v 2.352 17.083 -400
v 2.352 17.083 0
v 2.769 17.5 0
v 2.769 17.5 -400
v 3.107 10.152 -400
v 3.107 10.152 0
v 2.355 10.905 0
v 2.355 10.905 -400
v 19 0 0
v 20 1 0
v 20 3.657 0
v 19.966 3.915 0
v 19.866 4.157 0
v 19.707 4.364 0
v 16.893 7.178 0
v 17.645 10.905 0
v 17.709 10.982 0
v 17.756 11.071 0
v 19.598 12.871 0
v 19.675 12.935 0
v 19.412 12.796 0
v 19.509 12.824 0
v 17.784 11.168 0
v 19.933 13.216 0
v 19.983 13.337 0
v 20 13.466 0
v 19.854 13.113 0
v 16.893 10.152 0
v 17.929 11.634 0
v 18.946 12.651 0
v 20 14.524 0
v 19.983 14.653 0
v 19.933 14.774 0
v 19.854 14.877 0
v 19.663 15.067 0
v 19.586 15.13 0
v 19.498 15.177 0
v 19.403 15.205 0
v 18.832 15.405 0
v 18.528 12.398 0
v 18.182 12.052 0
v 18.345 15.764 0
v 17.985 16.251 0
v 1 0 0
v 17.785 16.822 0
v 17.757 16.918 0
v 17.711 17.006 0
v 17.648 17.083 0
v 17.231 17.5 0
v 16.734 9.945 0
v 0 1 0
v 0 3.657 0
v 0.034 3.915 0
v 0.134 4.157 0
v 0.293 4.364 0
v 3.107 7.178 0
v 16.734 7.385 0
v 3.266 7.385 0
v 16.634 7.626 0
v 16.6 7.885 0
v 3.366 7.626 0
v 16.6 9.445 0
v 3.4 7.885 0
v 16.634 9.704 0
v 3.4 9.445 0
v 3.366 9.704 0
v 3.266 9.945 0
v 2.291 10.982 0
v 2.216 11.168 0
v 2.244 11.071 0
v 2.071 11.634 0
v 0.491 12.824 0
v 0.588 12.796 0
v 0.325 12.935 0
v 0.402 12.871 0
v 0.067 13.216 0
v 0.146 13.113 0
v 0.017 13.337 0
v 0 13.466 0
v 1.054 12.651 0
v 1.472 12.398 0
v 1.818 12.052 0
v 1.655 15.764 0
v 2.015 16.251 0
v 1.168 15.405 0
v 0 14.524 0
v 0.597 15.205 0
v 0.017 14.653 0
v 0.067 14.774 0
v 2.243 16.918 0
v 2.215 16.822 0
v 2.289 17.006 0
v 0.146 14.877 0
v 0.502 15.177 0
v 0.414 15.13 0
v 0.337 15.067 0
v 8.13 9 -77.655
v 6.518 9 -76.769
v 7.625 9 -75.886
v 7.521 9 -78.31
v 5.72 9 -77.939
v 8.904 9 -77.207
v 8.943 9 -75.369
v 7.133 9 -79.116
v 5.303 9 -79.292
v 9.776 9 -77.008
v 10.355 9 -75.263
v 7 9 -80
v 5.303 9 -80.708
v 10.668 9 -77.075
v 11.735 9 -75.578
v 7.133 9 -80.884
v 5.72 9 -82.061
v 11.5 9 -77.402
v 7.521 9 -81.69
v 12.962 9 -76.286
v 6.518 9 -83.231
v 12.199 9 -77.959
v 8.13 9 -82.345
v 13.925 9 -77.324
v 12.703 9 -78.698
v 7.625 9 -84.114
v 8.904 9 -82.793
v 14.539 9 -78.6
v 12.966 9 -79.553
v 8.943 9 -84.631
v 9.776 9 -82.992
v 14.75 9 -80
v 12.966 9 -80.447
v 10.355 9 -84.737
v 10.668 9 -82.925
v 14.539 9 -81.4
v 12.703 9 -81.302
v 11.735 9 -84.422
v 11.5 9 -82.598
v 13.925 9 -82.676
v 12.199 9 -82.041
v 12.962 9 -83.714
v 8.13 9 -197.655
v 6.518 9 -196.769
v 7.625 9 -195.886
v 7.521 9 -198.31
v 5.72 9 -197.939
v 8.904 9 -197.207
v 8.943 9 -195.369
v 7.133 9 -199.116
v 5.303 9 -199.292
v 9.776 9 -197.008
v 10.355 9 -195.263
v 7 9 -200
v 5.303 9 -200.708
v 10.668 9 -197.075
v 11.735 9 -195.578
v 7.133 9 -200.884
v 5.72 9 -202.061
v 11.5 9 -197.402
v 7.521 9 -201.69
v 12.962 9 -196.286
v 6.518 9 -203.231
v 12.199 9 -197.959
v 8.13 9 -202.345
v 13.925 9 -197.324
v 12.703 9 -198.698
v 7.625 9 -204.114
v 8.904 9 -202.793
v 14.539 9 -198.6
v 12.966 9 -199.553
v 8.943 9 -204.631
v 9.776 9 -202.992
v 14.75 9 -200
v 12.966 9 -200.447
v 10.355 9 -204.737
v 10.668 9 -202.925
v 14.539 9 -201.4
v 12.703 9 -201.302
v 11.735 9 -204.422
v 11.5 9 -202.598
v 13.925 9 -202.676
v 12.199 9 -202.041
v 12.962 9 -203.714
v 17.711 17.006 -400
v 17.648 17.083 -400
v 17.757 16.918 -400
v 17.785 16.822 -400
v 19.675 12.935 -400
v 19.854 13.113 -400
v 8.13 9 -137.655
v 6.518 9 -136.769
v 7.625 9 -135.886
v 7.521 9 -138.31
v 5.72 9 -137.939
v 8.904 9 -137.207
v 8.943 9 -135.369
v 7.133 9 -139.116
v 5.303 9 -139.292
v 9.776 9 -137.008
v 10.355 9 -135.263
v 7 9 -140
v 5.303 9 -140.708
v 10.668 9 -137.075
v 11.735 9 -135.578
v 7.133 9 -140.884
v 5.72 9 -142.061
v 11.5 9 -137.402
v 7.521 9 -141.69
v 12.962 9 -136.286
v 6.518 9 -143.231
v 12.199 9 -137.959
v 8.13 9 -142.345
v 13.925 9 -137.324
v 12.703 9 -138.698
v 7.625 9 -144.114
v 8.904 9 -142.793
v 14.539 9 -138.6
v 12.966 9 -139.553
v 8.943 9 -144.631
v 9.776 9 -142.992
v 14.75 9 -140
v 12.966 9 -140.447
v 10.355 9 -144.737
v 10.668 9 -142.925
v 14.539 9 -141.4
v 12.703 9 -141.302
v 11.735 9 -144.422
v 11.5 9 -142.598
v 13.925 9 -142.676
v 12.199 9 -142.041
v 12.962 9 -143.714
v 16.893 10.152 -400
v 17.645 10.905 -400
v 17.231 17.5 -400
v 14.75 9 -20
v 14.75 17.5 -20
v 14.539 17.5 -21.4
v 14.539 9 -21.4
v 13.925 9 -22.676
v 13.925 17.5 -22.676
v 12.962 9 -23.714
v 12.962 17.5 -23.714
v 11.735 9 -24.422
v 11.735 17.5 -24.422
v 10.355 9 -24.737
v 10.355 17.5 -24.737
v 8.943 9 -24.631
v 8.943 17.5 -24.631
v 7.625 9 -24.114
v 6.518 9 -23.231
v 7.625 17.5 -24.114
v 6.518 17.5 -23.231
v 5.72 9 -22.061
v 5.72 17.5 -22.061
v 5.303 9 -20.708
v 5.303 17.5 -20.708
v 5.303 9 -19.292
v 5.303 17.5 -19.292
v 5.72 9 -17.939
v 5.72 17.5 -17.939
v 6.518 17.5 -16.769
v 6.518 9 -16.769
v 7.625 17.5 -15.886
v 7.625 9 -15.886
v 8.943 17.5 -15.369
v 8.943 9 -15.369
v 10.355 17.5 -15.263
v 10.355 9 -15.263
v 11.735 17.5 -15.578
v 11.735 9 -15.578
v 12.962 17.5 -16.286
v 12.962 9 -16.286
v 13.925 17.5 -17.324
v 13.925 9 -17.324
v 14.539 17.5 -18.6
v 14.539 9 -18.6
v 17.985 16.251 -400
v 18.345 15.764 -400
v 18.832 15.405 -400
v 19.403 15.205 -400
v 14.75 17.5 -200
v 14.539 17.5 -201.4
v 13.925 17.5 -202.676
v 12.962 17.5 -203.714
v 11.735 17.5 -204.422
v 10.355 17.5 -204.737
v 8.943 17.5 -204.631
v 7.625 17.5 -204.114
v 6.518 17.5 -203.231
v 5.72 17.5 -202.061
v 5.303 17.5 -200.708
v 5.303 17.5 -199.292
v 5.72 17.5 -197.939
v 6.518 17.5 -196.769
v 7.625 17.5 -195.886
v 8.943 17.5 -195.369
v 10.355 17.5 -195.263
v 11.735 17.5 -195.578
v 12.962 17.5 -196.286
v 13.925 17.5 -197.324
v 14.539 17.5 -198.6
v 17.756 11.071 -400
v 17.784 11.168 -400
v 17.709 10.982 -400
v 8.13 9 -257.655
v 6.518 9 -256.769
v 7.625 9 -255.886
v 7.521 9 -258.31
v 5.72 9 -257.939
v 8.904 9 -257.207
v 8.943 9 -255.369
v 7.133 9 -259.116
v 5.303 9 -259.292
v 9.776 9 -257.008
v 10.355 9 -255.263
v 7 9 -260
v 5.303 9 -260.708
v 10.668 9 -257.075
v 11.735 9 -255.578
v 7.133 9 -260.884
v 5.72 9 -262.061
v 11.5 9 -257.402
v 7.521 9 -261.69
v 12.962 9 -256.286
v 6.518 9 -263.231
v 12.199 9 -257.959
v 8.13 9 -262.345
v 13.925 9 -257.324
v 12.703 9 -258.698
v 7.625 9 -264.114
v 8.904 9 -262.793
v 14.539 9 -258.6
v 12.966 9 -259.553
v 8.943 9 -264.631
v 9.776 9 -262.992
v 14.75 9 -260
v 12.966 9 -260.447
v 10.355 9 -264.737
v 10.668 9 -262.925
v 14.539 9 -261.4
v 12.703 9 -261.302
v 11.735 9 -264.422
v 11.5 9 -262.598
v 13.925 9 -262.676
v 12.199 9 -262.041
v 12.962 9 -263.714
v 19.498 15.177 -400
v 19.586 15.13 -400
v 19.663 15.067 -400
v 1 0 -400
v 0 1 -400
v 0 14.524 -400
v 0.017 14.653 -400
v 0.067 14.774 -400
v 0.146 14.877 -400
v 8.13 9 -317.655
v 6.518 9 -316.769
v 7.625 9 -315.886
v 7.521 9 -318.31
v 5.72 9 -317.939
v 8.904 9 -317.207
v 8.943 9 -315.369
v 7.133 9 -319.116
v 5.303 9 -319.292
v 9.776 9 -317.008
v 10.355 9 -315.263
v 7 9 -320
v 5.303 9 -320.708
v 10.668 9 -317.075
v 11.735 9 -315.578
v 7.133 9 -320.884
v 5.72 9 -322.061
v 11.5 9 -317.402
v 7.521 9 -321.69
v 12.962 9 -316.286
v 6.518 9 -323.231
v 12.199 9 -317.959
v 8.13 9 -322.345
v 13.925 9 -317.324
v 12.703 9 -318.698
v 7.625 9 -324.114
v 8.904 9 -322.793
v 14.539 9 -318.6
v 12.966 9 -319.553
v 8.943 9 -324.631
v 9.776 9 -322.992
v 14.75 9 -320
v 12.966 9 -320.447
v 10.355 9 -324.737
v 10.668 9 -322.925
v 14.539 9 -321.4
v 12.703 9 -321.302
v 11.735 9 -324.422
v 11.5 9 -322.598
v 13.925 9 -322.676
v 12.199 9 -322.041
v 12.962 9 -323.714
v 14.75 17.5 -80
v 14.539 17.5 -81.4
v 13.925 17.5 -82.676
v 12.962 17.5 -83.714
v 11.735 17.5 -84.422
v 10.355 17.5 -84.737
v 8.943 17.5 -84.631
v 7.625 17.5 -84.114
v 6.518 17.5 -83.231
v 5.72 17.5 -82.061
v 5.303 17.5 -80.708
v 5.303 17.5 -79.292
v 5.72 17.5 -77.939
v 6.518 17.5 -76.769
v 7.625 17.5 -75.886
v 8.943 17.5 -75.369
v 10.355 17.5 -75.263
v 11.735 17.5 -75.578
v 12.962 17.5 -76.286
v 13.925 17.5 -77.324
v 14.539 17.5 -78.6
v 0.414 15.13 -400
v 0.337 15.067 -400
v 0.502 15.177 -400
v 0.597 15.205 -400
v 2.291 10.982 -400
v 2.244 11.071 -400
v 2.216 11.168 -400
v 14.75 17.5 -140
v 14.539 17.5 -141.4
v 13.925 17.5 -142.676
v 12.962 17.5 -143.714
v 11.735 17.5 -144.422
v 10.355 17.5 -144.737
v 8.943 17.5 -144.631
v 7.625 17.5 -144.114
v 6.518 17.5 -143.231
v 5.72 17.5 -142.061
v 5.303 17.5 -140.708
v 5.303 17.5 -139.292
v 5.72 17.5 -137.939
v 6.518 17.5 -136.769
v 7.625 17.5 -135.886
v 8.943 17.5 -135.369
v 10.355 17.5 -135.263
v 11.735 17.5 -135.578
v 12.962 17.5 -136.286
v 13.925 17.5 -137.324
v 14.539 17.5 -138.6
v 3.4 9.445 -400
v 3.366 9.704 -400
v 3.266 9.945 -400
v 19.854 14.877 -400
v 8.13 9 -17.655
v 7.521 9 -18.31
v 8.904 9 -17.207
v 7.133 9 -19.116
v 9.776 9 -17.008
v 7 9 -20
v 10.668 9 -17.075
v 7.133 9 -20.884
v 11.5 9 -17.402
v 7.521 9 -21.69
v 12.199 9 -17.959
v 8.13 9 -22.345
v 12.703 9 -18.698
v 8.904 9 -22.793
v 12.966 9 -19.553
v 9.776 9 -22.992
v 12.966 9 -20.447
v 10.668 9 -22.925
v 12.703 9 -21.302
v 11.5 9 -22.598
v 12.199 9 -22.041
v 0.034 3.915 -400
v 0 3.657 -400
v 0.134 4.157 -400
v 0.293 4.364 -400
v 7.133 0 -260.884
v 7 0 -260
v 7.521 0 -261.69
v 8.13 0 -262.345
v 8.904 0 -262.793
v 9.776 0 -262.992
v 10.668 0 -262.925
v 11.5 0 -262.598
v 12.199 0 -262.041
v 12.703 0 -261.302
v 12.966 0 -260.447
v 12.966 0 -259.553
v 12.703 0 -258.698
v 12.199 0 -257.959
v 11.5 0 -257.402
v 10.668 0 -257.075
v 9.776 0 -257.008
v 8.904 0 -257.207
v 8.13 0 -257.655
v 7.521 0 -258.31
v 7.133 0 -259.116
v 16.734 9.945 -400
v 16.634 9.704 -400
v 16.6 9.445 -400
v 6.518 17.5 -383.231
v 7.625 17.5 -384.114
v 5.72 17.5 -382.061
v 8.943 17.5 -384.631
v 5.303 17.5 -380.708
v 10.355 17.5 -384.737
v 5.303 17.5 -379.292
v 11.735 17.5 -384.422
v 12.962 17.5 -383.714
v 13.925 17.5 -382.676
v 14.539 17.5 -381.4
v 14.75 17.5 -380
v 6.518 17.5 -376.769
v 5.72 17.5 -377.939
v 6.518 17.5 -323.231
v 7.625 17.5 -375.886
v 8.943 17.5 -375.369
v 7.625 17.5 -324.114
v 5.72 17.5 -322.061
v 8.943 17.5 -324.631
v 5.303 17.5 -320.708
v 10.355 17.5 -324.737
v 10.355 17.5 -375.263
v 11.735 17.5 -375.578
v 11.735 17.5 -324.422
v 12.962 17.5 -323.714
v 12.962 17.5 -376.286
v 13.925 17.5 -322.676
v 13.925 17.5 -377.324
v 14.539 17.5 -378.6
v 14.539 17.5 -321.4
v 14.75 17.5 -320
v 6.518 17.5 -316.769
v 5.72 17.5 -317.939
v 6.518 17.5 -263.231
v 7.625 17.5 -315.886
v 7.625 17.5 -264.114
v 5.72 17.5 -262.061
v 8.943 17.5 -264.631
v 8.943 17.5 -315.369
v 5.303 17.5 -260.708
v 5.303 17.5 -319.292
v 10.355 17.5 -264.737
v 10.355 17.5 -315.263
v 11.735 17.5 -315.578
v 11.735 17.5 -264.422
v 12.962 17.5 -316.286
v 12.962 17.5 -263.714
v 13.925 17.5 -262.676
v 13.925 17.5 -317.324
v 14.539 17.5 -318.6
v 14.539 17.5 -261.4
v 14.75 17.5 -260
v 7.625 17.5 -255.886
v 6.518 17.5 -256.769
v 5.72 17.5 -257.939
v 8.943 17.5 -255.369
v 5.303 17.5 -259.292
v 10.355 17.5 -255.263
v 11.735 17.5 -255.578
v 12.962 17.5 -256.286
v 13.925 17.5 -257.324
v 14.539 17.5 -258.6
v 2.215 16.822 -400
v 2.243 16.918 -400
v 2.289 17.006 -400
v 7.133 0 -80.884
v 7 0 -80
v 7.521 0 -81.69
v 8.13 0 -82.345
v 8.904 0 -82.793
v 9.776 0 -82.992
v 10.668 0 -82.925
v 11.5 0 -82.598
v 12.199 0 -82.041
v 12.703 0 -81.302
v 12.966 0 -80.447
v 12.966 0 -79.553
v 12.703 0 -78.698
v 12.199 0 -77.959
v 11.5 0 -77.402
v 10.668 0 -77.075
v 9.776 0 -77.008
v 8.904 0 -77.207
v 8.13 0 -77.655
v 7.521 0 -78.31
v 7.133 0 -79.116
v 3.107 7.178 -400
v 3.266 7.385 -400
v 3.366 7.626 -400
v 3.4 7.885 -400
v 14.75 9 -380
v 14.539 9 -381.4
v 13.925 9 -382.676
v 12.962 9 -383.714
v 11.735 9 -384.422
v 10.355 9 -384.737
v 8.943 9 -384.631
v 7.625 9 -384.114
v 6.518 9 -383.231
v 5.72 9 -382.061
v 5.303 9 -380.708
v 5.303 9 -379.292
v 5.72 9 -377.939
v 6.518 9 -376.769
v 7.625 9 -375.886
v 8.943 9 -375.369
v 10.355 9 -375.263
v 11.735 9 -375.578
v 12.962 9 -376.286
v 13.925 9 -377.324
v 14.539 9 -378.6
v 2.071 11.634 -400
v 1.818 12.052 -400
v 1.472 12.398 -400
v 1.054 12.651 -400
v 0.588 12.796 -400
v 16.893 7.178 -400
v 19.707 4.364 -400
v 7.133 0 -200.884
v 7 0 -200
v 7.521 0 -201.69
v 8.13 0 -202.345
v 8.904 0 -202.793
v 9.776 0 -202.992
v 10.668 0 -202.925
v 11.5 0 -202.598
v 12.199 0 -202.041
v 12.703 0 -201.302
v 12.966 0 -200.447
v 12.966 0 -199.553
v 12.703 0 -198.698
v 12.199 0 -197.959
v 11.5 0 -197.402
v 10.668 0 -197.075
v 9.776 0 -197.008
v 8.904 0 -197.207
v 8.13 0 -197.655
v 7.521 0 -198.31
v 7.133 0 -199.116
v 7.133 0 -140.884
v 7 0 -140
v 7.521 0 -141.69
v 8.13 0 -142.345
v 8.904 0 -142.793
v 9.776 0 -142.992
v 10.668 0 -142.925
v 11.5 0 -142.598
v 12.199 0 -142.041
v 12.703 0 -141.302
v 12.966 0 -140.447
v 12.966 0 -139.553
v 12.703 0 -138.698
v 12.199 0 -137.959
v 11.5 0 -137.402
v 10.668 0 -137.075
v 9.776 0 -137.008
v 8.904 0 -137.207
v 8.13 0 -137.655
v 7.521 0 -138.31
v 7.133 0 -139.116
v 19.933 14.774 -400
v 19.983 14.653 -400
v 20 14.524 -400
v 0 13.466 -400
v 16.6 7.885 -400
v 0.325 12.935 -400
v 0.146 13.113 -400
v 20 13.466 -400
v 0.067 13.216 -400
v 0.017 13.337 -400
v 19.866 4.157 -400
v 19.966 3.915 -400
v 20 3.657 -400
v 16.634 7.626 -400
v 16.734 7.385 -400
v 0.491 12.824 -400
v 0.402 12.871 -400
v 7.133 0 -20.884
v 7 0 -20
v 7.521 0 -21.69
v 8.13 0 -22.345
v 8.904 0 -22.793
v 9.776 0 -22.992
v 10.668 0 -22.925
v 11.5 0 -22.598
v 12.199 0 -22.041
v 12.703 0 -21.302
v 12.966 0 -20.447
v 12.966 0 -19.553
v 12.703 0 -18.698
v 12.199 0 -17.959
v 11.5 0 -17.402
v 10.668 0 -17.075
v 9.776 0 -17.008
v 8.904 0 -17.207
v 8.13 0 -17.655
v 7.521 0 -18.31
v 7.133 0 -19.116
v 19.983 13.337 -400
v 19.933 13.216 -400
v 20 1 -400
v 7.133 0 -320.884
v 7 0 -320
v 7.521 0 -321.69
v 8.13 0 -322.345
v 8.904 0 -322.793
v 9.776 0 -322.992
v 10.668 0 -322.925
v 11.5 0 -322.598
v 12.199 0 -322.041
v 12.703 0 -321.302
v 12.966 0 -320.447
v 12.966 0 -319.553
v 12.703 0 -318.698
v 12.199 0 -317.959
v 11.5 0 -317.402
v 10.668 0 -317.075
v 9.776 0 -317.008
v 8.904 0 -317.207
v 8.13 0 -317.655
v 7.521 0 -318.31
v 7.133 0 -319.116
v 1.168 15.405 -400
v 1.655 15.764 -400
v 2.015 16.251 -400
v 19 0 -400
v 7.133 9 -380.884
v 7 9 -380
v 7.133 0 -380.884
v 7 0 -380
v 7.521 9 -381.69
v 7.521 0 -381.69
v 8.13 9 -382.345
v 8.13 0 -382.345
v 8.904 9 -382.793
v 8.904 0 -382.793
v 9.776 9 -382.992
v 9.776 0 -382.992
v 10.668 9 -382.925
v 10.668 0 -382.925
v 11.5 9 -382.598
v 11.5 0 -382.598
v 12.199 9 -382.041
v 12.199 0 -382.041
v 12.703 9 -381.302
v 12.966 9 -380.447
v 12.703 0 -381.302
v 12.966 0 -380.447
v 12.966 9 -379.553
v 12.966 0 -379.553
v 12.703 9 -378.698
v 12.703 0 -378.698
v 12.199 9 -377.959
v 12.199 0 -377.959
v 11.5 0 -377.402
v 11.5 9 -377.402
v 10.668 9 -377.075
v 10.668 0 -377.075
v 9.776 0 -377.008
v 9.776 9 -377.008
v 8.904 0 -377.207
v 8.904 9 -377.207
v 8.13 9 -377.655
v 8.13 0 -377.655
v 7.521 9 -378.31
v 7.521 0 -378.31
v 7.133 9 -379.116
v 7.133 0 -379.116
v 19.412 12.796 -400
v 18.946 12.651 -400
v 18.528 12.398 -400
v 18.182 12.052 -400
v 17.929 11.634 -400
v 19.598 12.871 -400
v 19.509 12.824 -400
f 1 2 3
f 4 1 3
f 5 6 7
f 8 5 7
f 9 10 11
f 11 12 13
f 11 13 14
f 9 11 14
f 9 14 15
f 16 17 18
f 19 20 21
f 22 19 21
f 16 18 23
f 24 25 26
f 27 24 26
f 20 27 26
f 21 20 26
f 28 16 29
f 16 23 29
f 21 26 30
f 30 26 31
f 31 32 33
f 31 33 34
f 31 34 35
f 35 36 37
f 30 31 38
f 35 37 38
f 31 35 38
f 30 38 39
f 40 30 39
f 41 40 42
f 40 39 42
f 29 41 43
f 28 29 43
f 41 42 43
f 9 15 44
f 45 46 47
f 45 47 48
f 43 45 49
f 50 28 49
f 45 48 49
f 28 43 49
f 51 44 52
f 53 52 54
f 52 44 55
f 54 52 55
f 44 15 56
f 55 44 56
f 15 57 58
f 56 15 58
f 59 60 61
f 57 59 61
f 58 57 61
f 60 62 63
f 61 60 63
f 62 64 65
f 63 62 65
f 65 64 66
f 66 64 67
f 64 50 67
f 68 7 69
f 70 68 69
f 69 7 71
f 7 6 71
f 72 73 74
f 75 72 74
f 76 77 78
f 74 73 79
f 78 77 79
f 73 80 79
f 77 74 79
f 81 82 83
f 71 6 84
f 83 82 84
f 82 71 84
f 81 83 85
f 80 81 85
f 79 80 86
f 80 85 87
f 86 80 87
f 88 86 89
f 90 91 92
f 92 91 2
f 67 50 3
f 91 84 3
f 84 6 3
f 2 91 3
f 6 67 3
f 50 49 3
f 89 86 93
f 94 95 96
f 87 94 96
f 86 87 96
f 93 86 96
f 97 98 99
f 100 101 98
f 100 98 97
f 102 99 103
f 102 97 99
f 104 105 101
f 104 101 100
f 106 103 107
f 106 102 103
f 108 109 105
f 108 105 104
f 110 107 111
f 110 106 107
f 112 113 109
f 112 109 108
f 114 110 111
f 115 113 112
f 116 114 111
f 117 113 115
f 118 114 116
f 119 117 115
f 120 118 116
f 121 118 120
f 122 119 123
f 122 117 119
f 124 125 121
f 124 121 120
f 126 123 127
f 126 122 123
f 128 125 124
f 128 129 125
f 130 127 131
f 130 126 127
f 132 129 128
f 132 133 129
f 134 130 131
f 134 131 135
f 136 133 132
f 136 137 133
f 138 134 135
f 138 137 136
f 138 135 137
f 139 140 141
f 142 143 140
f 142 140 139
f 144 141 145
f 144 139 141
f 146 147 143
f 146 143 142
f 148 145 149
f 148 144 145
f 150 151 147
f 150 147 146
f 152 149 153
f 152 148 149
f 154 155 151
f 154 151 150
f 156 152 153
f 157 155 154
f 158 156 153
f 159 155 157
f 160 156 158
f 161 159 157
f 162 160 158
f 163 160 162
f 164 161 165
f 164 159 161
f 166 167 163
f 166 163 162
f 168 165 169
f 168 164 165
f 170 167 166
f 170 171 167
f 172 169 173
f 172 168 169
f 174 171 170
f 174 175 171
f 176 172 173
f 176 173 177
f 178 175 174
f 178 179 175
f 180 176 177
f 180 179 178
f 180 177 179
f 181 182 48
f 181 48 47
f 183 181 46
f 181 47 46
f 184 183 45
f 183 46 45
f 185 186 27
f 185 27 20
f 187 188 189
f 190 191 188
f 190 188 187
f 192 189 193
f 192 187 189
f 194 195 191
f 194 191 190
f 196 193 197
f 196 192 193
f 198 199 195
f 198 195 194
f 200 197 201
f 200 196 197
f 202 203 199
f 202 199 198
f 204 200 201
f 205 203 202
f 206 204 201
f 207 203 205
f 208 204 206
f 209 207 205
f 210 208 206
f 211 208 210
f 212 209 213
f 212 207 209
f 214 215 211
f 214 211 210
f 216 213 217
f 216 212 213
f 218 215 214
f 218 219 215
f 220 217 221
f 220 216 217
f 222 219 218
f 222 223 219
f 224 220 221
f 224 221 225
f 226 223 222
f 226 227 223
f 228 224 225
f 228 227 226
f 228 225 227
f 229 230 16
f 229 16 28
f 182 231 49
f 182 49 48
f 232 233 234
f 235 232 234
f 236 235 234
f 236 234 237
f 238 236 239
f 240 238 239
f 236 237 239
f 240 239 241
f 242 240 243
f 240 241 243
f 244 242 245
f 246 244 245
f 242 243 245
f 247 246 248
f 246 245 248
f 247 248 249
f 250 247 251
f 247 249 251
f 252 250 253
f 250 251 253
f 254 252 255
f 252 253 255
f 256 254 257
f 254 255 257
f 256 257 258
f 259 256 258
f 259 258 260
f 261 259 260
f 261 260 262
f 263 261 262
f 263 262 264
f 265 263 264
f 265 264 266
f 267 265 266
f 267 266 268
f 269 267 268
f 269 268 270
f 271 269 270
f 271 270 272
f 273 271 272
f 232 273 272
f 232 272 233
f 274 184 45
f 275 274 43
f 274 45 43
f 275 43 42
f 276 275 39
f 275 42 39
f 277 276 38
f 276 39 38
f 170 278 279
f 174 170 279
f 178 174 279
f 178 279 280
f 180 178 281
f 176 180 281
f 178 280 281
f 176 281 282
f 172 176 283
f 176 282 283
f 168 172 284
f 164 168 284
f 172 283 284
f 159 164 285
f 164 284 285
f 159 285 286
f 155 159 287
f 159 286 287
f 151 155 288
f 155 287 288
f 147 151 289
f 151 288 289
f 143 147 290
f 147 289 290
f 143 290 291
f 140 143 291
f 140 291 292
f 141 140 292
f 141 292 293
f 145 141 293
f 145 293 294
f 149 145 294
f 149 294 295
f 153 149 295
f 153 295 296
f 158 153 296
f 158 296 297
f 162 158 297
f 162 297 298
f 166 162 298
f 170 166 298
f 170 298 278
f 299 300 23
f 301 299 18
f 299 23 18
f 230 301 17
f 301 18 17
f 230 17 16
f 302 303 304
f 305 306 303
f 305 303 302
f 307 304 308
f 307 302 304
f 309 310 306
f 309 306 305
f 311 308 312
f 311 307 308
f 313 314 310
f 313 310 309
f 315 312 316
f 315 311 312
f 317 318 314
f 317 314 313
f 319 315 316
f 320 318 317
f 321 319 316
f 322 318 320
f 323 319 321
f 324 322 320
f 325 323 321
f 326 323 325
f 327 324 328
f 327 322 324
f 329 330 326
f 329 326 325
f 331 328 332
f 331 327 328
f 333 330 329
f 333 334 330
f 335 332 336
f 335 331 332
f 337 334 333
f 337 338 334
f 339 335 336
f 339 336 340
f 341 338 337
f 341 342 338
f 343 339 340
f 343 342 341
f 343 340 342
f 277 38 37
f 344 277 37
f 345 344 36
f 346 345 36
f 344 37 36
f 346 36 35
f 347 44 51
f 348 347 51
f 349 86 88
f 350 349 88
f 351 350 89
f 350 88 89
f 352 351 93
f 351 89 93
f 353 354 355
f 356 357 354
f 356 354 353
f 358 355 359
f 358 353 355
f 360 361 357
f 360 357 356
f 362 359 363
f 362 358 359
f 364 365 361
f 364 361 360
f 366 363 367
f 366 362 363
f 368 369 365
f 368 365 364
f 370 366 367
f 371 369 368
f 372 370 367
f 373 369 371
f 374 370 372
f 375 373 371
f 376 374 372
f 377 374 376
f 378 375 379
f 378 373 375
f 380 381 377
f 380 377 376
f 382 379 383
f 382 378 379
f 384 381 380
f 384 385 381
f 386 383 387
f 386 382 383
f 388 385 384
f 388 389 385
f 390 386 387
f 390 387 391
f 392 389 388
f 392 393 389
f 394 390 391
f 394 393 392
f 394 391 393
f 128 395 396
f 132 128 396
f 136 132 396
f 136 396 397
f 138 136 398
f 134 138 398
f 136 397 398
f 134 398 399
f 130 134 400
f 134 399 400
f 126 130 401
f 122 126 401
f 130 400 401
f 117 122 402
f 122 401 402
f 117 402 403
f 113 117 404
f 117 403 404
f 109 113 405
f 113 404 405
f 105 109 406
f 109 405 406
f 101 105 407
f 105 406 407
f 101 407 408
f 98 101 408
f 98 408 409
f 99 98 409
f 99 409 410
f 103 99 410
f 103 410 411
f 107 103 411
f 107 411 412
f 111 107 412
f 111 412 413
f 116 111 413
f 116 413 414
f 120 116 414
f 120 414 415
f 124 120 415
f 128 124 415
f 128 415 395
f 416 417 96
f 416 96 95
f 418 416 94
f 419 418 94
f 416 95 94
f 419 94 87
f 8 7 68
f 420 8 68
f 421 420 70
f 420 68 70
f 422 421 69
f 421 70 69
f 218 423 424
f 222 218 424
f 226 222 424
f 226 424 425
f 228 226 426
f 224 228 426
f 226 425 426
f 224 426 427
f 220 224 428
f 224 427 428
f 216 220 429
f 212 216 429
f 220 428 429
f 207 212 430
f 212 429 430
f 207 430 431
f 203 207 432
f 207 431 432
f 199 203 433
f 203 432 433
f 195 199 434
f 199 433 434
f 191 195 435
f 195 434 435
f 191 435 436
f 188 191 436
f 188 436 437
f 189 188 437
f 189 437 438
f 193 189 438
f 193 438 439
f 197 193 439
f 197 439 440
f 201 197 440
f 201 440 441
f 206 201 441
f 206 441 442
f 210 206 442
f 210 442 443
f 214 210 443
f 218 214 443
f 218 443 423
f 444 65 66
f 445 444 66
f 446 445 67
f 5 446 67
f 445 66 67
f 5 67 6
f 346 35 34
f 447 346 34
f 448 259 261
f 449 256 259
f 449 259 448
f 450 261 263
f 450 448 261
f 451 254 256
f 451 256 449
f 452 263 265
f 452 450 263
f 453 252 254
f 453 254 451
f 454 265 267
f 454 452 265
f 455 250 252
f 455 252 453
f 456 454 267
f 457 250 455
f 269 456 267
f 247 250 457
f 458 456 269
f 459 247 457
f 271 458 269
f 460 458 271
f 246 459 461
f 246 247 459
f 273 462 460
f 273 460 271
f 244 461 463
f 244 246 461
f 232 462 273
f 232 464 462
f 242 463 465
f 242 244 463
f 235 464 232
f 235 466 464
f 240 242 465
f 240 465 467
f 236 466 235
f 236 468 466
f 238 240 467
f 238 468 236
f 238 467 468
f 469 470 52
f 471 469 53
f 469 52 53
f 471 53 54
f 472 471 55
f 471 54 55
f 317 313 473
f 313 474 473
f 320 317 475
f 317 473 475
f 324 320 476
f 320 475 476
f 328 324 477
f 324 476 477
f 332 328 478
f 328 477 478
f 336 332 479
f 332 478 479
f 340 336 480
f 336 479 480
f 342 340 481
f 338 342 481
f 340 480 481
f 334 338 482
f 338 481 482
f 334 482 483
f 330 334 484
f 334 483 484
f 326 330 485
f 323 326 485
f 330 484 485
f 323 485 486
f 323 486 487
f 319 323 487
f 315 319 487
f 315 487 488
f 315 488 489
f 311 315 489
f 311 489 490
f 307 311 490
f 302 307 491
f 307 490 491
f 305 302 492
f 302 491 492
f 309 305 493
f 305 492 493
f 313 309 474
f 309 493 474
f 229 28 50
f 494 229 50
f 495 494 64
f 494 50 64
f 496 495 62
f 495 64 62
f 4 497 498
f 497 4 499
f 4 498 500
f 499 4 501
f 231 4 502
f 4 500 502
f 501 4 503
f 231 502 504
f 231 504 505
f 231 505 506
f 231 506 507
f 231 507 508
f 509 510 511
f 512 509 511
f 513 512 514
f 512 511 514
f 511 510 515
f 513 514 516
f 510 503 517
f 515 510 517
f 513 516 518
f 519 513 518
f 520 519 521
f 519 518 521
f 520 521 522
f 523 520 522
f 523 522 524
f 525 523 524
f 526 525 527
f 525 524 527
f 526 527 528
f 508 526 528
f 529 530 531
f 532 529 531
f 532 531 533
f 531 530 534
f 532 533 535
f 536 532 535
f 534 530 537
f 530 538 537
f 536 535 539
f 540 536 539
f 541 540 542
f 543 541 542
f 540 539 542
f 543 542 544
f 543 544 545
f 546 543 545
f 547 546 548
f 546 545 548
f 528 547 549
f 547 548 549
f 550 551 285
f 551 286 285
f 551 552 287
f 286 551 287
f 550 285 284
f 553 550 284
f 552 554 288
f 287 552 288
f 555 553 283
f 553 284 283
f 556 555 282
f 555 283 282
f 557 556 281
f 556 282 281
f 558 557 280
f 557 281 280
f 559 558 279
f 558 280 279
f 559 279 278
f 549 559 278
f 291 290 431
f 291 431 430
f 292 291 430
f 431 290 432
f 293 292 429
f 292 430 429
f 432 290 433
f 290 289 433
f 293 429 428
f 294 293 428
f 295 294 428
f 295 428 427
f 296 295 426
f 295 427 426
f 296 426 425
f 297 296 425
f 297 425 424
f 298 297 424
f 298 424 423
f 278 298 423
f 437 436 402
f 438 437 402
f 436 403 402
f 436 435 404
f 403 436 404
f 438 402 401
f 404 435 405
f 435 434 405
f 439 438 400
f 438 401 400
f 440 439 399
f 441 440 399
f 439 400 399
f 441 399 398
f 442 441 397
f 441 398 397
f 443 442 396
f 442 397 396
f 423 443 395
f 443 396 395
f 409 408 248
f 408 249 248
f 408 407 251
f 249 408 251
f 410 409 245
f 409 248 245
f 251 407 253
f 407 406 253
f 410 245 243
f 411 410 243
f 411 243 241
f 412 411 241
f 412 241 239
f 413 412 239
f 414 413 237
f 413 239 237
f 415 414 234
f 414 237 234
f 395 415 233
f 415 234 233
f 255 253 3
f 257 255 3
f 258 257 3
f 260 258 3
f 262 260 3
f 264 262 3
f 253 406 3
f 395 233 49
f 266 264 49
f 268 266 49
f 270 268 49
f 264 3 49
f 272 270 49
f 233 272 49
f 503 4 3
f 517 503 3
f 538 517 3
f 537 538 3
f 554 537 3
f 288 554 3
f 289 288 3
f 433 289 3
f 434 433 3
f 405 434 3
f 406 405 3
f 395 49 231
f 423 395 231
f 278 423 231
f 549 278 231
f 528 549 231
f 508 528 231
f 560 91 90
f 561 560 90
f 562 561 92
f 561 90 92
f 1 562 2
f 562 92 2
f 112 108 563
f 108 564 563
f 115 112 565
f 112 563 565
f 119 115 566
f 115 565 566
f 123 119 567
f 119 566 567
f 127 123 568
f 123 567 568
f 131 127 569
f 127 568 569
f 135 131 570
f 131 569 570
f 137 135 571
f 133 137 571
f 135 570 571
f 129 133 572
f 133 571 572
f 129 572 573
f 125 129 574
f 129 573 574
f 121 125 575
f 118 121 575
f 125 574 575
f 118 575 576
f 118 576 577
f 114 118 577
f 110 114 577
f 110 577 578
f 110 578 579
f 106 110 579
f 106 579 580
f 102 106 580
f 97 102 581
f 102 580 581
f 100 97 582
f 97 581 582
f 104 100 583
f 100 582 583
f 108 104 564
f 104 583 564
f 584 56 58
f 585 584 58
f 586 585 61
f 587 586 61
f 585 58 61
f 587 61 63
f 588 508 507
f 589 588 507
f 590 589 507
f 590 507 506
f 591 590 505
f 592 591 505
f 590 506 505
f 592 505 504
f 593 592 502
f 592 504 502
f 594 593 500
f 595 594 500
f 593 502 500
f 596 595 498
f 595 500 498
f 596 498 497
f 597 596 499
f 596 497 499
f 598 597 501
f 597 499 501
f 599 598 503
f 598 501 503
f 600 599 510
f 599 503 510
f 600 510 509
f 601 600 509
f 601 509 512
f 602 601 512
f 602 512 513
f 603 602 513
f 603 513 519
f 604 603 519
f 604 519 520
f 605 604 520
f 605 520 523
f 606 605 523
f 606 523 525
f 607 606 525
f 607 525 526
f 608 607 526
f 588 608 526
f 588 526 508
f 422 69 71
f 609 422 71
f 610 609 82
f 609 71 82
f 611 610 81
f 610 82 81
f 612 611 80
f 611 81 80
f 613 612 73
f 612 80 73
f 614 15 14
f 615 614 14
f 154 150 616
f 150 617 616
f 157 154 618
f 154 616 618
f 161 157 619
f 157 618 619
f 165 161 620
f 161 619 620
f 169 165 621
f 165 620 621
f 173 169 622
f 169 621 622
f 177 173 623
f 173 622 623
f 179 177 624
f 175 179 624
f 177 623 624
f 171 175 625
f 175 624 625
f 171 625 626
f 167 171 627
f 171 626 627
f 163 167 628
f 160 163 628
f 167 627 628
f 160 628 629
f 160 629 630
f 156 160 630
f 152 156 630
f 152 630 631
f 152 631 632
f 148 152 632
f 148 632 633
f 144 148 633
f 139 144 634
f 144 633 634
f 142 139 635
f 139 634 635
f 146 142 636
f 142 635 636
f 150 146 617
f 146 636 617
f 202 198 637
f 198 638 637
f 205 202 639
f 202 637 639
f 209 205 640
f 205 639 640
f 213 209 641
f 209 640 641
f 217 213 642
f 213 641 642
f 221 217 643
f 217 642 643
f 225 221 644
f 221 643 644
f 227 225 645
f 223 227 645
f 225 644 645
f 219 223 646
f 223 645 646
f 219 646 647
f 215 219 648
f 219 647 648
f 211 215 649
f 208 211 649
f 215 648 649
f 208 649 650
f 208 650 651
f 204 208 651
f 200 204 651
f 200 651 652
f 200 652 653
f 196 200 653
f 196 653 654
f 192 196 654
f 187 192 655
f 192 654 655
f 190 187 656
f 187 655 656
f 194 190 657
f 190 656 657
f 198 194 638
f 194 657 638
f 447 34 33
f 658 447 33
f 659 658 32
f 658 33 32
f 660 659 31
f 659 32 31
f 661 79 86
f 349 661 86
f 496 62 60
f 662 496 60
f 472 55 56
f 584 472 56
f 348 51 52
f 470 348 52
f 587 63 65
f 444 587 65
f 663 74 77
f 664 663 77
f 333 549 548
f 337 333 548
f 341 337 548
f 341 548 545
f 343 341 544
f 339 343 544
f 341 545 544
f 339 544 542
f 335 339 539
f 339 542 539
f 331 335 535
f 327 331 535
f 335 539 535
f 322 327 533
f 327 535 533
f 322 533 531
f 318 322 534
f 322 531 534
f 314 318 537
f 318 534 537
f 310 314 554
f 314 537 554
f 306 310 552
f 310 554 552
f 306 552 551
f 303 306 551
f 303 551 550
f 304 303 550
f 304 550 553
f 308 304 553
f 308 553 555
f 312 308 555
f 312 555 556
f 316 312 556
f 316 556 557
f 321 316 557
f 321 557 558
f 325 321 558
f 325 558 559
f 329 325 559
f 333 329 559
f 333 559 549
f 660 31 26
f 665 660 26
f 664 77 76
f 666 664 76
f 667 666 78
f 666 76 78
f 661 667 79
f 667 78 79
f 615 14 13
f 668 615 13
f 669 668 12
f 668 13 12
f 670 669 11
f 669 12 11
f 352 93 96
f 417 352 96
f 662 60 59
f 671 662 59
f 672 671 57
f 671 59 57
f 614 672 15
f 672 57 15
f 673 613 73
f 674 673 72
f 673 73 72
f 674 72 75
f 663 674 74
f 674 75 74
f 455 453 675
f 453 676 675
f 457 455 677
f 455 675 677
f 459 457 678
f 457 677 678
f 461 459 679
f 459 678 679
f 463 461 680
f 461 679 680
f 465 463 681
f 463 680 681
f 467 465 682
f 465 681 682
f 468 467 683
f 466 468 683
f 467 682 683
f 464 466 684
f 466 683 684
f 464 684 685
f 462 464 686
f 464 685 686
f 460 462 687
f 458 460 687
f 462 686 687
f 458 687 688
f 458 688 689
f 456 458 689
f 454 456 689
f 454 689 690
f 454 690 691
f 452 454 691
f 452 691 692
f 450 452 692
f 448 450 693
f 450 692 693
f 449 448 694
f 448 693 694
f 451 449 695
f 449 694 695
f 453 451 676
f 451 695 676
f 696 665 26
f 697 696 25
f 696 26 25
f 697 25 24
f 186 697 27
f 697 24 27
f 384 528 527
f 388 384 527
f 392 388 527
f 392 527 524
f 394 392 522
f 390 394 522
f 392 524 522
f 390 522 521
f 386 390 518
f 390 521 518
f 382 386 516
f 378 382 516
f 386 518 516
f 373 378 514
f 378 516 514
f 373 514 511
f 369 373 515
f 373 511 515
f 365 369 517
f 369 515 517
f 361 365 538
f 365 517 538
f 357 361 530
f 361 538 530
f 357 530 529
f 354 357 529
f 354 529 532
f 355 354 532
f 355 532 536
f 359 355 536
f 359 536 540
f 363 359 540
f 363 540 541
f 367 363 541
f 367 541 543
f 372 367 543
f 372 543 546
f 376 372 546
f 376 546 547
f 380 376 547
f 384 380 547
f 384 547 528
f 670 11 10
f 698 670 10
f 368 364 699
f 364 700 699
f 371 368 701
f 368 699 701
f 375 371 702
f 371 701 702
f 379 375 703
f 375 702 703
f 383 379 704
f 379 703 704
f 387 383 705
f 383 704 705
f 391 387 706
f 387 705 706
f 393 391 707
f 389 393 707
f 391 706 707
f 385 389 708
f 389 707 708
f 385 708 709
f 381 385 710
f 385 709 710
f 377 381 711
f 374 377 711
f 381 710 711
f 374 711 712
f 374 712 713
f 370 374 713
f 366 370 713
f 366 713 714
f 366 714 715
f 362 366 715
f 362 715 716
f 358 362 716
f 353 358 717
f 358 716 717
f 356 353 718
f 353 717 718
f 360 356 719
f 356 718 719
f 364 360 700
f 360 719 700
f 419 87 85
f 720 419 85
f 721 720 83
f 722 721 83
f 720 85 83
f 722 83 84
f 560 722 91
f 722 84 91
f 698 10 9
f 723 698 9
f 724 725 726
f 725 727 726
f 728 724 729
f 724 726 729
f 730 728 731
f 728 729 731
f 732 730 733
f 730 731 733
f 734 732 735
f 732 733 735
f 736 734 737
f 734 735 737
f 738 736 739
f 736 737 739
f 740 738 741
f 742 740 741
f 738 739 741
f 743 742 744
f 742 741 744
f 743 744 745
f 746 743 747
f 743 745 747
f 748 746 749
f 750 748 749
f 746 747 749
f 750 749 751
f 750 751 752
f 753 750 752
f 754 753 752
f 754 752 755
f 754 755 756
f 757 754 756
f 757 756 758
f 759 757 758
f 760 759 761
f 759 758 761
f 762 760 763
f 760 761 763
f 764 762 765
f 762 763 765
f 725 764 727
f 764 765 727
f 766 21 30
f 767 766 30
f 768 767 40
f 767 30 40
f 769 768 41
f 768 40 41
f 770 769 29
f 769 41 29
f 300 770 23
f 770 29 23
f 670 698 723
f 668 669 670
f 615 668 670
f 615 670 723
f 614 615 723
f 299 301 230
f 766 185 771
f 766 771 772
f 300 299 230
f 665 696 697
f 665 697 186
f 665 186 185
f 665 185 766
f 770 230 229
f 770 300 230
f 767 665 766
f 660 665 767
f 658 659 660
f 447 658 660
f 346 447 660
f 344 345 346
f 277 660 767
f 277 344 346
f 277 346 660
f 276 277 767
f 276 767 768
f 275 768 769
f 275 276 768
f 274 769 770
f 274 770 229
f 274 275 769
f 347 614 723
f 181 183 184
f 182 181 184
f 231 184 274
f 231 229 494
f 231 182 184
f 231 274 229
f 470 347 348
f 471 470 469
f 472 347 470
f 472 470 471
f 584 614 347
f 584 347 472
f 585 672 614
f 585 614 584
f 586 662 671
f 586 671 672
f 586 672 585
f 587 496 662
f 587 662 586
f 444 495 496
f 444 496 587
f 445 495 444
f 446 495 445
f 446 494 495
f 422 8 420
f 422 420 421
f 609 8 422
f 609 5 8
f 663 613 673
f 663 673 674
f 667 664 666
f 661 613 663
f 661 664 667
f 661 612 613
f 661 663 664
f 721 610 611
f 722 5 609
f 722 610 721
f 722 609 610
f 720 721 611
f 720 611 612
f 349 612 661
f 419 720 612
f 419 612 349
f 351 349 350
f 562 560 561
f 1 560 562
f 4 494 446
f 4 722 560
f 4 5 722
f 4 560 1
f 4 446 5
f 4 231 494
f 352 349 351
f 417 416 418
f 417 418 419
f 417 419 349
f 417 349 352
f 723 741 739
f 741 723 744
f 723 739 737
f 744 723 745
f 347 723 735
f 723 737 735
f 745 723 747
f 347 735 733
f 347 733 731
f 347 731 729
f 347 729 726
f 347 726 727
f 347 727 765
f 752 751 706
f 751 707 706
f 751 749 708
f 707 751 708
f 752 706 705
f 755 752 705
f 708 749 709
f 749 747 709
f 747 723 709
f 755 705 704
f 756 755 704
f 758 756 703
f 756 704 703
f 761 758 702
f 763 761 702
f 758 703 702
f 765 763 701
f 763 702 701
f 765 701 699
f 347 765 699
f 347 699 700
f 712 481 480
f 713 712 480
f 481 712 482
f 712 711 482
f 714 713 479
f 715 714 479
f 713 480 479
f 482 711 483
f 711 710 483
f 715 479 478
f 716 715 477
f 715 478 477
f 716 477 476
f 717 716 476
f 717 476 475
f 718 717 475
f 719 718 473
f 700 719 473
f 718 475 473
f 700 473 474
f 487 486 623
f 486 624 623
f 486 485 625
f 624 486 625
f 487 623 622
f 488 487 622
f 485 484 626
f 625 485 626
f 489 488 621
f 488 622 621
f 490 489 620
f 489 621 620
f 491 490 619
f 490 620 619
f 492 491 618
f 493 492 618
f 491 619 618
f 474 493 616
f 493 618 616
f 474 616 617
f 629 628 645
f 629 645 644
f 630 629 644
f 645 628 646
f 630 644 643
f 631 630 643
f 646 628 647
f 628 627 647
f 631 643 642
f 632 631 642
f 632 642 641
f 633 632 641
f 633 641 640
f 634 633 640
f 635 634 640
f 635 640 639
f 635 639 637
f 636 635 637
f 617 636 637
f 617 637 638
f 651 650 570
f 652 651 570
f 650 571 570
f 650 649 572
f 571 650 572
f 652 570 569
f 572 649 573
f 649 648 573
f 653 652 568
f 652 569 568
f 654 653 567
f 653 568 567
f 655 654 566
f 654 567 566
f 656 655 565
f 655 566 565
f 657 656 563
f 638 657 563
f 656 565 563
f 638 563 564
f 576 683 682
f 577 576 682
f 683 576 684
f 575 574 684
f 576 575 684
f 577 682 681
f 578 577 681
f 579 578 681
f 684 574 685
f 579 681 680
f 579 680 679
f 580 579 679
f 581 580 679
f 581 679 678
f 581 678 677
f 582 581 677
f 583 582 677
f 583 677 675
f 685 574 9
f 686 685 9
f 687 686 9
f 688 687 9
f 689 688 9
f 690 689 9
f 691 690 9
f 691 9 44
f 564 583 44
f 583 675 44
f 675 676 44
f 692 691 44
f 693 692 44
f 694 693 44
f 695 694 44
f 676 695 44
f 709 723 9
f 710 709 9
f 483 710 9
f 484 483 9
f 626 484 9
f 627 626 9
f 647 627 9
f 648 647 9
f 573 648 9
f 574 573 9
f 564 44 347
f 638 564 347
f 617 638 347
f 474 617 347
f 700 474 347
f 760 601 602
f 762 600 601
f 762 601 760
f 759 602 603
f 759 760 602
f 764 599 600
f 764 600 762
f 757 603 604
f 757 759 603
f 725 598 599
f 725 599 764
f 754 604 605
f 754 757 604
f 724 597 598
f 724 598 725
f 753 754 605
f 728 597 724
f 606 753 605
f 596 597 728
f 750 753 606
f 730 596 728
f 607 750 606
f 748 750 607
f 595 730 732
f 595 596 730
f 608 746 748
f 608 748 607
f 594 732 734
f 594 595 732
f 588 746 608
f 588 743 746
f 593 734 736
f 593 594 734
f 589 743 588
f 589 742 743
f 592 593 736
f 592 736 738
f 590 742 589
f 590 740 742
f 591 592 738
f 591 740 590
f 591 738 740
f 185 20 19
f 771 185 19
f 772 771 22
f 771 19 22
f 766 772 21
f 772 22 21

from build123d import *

# Parameters (mm, degrees)
EXTRUDE_1_DEPTH           = 400
HOLE_WIZARD_1_D           = 6
HOLE_WIZARD_1_CBORE_D     = 9.5
HOLE_WIZARD_1_CBORE_DEPTH = 8.5
PATTERN_LINEAR_1_COUNT    = 7
PATTERN_LINEAR_1_PITCH    = 60


with BuildPart() as part:
    # 草图1 → 凸台-拉伸1 (new body)
    with BuildSketch(Plane.XY):
        with BuildLine():
            Line((0.146446607, 14.877167225), (0.33665166, 15.067372278))
            ThreePointArc((0.33665166, 15.067372278), (0.456581276, 15.155881832), (0.597272425, 15.205106231))
            ThreePointArc((0.597272425, 15.205106231), (1.655392341, 15.764307144), (2.214593278, 16.822427055))
            ThreePointArc((2.214593278, 16.822427055), (2.263817599, 16.96311829), (2.3523274, 17.083047759))
            Line((2.3523274, 17.083047759), (2.769279462, 17.499999821))
            Line((2.769279462, 17.499999821), (17.230720684, 17.499999821))
            Line((17.230720684, 17.499999821), (17.647672747, 17.083047759))
            ThreePointArc((17.647672747, 17.083047759), (17.736182286, 16.963118168), (17.785406689, 16.822427051))
            ThreePointArc((17.785406689, 16.822427051), (18.344607694, 15.764307233), (19.402727615, 15.205106406))
            ThreePointArc((19.402727615, 15.205106406), (19.54341887, 15.155882087), (19.663348354, 15.067372278))
            Line((19.663348354, 15.067372278), (19.853553407, 14.877167225))
            ThreePointArc((19.853553407, 14.877167225), (19.961939783, 14.714955551), (20.000000017, 14.523613835))
            Line((20.000000017, 14.523613835), (20.000000017, 13.466386174))
            ThreePointArc((20.000000017, 13.466386174), (19.961939783, 13.275044458), (19.853553407, 13.112832784))
            Line((19.853553407, 13.112832784), (19.675343411, 12.934622787))
            ThreePointArc((19.675343411, 12.934622787), (19.554347233, 12.845550893), (19.412352183, 12.796446074))
            ThreePointArc((19.412352183, 12.796446074), (18.344607801, 12.23544862), (17.783610347, 11.167704238))
            ThreePointArc((17.783610347, 11.167704238), (17.734505529, 11.025709189), (17.645433635, 10.904713011))
            Line((17.645433635, 10.904713011), (16.892893236, 10.152172612))
            ThreePointArc((16.892893236, 10.152172612), (16.676120484, 9.827749263), (16.600000023, 9.44506583))
            Line((16.600000023, 9.44506583), (16.600000023, 7.884934177))
            ThreePointArc((16.600000023, 7.884934177), (16.67612049, 7.502250748), (16.892893231, 7.177827393))
            Line((16.892893231, 7.177827393), (19.707106793, 4.363613831))
            ThreePointArc((19.707106793, 4.363613831), (19.923879539, 4.039190479), (20.000000006, 3.656507049))
            Line((20.000000006, 3.656507049), (20.000000006, 1))
            Line((20.000000006, 1), (19.000000006, 0))
            Line((19.000000006, 0), (1.000000006, 0))
            Line((1.000000006, 0), (6e-09, 1))
            Line((6e-09, 1), (6e-09, 3.656507049))
            ThreePointArc((6e-09, 3.656507049), (0.076120462, 4.039190482), (0.292893214, 4.363613832))
            Line((0.292893214, 4.363613832), (3.107106776, 7.177827394))
            ThreePointArc((3.107106776, 7.177827394), (3.323879528, 7.502250744), (3.399999989, 7.884934177))
            Line((3.399999989, 7.884934177), (3.399999989, 9.44506583))
            ThreePointArc((3.399999989, 9.44506583), (3.323879522, 9.827749259), (3.107106778, 10.152172612))
            Line((3.107106778, 10.152172612), (2.35456638, 10.904713011))
            ThreePointArc((2.35456638, 10.904713011), (2.265494485, 11.025709189), (2.216389667, 11.167704238))
            ThreePointArc((2.216389667, 11.167704238), (1.655392213, 12.235448621), (0.587647831, 12.796446074))
            ThreePointArc((0.587647831, 12.796446074), (0.445652781, 12.845550893), (0.324656604, 12.934622787))
            Line((0.324656604, 12.934622787), (0.146446607, 13.112832784))
            ThreePointArc((0.146446607, 13.112832784), (0.038060231, 13.275044458), (-3e-09, 13.466386175))
            Line((-3e-09, 13.466386175), (-3e-09, 14.523613835))
            ThreePointArc((-3e-09, 14.523613835), (0.038060231, 14.714955551), (0.146446607, 14.877167225))
        make_face()
    extrude(amount=-EXTRUDE_1_DEPTH)

    # 打孔尺寸根据内六角圆柱头螺钉的类型1 (through all)
    with Locations(Plane(origin=(0, 17.499999821, 0), x_dir=(1, 0, 0), z_dir=(0, 1, 0))):
        with Locations((10.000000073, 20)):
            hole_wizard_1 = CounterBoreHole(HOLE_WIZARD_1_D / 2, HOLE_WIZARD_1_CBORE_D / 2, HOLE_WIZARD_1_CBORE_DEPTH)

    # 阵列(线性)1: 打孔尺寸根据内六角圆柱头螺钉的类型1 ×7
    with Locations(*[(0, 0, -i * PATTERN_LINEAR_1_PITCH) for i in range(1, PATTERN_LINEAR_1_COUNT)]):
        add(hole_wizard_1, mode=Mode.SUBTRACT)


solid = part.part
